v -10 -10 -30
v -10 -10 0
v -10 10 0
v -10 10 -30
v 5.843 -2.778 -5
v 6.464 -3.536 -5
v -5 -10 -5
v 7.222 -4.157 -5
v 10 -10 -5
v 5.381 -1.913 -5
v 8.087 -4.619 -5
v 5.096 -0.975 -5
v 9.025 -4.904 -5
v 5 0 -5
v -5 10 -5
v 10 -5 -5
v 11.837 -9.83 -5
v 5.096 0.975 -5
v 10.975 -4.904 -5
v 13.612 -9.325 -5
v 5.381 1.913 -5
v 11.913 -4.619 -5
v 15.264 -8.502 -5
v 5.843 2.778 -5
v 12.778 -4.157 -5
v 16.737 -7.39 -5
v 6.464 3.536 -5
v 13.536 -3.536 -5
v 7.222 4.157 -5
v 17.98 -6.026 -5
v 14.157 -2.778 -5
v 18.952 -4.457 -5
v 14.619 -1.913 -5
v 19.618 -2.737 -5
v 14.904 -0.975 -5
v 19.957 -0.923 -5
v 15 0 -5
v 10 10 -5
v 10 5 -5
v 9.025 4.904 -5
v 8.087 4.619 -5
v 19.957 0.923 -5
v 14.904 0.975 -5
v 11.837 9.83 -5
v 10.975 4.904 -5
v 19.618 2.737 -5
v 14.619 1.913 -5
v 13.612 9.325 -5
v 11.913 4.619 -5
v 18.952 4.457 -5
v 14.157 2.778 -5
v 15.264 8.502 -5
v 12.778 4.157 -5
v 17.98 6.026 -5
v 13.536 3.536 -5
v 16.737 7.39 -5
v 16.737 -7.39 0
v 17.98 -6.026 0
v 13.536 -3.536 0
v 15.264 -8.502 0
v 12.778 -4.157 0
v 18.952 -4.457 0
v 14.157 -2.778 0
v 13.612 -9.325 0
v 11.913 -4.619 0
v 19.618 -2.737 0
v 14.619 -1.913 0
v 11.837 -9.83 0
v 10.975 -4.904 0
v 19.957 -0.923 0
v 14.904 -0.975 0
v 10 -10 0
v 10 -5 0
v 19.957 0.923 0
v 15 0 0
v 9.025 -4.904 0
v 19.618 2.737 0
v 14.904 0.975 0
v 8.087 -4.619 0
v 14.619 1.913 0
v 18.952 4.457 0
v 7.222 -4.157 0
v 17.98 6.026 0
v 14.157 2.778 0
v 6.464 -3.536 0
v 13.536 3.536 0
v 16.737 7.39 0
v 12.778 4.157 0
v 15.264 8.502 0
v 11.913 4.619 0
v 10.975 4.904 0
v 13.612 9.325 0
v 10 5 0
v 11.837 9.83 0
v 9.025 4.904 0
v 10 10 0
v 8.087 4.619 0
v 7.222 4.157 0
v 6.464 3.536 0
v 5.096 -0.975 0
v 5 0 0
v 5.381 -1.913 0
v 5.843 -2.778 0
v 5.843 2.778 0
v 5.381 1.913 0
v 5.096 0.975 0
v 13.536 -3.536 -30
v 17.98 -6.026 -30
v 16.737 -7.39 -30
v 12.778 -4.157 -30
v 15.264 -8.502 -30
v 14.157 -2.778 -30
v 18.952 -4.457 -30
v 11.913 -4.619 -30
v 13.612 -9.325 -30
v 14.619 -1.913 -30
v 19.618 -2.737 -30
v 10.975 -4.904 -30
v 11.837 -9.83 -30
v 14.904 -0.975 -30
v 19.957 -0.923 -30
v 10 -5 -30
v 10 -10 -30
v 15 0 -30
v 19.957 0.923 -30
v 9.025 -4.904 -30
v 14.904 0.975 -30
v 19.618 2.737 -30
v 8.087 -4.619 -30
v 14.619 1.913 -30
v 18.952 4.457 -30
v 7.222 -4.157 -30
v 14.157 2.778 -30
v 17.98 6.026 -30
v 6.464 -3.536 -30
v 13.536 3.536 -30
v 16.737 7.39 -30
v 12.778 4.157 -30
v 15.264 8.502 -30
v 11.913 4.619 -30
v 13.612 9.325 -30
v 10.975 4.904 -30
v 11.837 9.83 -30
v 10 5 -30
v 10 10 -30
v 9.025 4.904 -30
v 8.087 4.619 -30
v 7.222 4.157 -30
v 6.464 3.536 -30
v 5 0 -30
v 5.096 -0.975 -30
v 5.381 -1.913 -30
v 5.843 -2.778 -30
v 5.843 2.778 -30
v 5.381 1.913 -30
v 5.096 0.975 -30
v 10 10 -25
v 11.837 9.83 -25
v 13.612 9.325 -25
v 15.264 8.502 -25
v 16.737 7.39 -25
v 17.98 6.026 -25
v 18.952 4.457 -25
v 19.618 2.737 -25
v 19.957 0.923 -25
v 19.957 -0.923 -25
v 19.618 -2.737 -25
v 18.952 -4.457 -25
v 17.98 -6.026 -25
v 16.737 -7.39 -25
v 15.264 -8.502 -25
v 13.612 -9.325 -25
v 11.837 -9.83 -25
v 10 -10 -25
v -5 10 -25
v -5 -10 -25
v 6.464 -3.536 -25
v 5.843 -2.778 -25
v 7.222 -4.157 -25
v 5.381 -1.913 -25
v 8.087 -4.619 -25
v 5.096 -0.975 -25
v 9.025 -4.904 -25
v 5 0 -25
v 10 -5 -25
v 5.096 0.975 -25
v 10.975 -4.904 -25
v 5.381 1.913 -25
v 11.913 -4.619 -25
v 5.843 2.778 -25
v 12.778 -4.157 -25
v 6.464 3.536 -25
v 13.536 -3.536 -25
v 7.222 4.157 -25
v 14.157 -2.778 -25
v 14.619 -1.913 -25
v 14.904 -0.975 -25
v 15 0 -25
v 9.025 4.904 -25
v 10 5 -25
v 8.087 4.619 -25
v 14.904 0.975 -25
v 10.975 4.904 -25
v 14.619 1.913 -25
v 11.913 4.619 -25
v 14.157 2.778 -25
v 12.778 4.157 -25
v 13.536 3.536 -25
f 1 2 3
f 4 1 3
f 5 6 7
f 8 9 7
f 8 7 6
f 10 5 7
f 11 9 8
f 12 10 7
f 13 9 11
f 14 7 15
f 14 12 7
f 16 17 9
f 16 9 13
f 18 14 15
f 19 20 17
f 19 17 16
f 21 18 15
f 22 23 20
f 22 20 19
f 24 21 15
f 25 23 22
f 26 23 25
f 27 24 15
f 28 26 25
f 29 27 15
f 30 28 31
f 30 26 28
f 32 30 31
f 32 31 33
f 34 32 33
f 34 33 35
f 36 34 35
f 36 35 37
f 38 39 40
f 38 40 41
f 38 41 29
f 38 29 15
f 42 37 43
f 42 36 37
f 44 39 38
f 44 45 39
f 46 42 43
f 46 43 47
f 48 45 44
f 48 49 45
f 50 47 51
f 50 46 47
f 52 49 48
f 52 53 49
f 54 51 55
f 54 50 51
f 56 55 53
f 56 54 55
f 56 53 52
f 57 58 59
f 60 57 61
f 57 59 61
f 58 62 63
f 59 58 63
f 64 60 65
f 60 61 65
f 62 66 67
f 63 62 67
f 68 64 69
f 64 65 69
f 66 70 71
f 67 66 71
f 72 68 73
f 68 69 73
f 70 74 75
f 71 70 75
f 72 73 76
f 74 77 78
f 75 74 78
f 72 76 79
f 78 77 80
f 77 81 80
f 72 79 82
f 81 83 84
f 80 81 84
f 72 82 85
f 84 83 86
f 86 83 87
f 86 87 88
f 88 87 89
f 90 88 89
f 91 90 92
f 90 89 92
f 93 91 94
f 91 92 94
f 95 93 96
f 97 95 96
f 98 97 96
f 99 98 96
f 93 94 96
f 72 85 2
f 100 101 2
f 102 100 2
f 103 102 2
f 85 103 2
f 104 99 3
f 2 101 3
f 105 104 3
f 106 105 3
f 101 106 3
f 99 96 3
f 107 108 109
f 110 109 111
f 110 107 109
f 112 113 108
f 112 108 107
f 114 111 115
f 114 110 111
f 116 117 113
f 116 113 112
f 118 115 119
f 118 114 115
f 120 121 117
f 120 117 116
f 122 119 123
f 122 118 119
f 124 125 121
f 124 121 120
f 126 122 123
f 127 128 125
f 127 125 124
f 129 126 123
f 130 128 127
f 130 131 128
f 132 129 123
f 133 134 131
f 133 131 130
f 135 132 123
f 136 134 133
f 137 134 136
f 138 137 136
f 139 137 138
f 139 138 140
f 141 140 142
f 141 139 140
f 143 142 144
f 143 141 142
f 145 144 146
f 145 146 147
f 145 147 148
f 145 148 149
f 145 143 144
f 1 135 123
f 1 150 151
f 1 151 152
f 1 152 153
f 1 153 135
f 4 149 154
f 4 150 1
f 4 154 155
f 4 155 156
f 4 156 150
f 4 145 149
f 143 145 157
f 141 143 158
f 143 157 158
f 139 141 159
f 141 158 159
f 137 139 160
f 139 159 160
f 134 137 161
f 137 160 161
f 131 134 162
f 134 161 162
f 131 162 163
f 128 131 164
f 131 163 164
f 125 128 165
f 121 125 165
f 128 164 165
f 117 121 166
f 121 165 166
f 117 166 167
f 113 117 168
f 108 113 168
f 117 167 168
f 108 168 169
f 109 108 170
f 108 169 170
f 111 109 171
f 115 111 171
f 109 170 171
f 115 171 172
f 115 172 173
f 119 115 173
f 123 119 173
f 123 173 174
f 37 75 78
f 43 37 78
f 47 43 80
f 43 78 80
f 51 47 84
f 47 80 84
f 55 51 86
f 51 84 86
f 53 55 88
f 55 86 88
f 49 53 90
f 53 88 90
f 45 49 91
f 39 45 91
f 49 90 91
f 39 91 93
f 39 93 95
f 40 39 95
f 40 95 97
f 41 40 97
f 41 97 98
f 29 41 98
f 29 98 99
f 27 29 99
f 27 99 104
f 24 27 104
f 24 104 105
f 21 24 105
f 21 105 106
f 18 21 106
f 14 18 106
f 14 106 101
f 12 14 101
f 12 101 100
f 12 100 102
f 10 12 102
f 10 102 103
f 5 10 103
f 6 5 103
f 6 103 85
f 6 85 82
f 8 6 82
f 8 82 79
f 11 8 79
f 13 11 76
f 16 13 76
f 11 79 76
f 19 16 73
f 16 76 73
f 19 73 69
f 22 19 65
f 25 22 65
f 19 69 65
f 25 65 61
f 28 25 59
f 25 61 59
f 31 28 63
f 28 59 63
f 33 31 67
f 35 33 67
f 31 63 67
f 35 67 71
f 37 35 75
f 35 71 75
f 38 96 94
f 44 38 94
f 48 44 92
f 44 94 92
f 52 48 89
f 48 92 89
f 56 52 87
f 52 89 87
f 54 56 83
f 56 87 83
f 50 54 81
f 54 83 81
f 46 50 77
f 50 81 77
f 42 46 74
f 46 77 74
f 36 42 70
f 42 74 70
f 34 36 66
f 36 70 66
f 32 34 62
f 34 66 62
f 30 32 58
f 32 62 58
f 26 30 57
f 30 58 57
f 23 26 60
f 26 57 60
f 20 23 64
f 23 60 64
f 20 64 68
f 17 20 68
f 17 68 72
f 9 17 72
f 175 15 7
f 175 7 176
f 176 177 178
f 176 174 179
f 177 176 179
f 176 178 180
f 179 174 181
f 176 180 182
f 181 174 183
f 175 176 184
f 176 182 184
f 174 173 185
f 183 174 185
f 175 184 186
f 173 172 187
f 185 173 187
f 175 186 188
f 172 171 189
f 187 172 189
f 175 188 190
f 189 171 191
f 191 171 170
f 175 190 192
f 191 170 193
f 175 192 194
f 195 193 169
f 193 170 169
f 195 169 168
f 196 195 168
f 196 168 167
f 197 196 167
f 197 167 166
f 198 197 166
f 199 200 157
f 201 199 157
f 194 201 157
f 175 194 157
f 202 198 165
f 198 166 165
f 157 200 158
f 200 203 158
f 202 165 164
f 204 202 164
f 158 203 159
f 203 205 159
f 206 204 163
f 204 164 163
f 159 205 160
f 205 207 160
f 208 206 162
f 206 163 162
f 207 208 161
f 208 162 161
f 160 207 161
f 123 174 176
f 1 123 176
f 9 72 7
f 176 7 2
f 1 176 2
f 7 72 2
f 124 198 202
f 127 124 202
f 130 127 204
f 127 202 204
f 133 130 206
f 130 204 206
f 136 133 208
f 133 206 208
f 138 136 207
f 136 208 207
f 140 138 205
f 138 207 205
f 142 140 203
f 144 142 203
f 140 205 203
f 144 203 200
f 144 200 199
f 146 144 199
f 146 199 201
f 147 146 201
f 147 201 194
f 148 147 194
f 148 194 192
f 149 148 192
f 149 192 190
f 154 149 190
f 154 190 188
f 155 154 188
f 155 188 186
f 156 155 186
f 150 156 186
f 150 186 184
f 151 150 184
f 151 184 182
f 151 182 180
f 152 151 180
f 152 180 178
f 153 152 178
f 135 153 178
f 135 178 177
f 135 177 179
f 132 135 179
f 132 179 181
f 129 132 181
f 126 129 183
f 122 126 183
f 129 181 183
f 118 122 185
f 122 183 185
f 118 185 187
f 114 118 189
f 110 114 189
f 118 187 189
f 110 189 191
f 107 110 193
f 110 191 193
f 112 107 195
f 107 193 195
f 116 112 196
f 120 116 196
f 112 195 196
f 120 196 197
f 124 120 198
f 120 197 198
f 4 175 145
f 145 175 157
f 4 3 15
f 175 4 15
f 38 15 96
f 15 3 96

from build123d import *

# Parameters (mm, degrees)
SKETCH1_R           = 5
BOSS_EXTRUDE1_DEPTH = 30
SKETCH2_W           = 20
SKETCH2_H           = 20
CUT_EXTRUDE1_DEPTH  = 25


with BuildPart() as part:
    # Sketch1 → Boss-Extrude1 (new body)
    with BuildSketch(Plane.XY):
        with BuildLine():
            Line((-10, 10), (10, 10))
            ThreePointArc((10, 10), (20, 0), (10, -10))
            Line((10, -10), (-10, -10))
            Line((-10, -10), (-10, 10))
        make_face()
        with Locations((10, 0)):
            Circle(SKETCH1_R, mode=Mode.SUBTRACT)
    extrude(amount=-BOSS_EXTRUDE1_DEPTH)

    # Sketch2 → Cut-Extrude1 (cut)
    with BuildSketch(Plane(origin=(20, 0, 0), x_dir=(0, 0, -1), z_dir=(1, 0, 0))):
        with Locations((15, 0)):
            Rectangle(SKETCH2_W, SKETCH2_H)
    extrude(amount=-CUT_EXTRUDE1_DEPTH, mode=Mode.SUBTRACT)


solid = part.part
